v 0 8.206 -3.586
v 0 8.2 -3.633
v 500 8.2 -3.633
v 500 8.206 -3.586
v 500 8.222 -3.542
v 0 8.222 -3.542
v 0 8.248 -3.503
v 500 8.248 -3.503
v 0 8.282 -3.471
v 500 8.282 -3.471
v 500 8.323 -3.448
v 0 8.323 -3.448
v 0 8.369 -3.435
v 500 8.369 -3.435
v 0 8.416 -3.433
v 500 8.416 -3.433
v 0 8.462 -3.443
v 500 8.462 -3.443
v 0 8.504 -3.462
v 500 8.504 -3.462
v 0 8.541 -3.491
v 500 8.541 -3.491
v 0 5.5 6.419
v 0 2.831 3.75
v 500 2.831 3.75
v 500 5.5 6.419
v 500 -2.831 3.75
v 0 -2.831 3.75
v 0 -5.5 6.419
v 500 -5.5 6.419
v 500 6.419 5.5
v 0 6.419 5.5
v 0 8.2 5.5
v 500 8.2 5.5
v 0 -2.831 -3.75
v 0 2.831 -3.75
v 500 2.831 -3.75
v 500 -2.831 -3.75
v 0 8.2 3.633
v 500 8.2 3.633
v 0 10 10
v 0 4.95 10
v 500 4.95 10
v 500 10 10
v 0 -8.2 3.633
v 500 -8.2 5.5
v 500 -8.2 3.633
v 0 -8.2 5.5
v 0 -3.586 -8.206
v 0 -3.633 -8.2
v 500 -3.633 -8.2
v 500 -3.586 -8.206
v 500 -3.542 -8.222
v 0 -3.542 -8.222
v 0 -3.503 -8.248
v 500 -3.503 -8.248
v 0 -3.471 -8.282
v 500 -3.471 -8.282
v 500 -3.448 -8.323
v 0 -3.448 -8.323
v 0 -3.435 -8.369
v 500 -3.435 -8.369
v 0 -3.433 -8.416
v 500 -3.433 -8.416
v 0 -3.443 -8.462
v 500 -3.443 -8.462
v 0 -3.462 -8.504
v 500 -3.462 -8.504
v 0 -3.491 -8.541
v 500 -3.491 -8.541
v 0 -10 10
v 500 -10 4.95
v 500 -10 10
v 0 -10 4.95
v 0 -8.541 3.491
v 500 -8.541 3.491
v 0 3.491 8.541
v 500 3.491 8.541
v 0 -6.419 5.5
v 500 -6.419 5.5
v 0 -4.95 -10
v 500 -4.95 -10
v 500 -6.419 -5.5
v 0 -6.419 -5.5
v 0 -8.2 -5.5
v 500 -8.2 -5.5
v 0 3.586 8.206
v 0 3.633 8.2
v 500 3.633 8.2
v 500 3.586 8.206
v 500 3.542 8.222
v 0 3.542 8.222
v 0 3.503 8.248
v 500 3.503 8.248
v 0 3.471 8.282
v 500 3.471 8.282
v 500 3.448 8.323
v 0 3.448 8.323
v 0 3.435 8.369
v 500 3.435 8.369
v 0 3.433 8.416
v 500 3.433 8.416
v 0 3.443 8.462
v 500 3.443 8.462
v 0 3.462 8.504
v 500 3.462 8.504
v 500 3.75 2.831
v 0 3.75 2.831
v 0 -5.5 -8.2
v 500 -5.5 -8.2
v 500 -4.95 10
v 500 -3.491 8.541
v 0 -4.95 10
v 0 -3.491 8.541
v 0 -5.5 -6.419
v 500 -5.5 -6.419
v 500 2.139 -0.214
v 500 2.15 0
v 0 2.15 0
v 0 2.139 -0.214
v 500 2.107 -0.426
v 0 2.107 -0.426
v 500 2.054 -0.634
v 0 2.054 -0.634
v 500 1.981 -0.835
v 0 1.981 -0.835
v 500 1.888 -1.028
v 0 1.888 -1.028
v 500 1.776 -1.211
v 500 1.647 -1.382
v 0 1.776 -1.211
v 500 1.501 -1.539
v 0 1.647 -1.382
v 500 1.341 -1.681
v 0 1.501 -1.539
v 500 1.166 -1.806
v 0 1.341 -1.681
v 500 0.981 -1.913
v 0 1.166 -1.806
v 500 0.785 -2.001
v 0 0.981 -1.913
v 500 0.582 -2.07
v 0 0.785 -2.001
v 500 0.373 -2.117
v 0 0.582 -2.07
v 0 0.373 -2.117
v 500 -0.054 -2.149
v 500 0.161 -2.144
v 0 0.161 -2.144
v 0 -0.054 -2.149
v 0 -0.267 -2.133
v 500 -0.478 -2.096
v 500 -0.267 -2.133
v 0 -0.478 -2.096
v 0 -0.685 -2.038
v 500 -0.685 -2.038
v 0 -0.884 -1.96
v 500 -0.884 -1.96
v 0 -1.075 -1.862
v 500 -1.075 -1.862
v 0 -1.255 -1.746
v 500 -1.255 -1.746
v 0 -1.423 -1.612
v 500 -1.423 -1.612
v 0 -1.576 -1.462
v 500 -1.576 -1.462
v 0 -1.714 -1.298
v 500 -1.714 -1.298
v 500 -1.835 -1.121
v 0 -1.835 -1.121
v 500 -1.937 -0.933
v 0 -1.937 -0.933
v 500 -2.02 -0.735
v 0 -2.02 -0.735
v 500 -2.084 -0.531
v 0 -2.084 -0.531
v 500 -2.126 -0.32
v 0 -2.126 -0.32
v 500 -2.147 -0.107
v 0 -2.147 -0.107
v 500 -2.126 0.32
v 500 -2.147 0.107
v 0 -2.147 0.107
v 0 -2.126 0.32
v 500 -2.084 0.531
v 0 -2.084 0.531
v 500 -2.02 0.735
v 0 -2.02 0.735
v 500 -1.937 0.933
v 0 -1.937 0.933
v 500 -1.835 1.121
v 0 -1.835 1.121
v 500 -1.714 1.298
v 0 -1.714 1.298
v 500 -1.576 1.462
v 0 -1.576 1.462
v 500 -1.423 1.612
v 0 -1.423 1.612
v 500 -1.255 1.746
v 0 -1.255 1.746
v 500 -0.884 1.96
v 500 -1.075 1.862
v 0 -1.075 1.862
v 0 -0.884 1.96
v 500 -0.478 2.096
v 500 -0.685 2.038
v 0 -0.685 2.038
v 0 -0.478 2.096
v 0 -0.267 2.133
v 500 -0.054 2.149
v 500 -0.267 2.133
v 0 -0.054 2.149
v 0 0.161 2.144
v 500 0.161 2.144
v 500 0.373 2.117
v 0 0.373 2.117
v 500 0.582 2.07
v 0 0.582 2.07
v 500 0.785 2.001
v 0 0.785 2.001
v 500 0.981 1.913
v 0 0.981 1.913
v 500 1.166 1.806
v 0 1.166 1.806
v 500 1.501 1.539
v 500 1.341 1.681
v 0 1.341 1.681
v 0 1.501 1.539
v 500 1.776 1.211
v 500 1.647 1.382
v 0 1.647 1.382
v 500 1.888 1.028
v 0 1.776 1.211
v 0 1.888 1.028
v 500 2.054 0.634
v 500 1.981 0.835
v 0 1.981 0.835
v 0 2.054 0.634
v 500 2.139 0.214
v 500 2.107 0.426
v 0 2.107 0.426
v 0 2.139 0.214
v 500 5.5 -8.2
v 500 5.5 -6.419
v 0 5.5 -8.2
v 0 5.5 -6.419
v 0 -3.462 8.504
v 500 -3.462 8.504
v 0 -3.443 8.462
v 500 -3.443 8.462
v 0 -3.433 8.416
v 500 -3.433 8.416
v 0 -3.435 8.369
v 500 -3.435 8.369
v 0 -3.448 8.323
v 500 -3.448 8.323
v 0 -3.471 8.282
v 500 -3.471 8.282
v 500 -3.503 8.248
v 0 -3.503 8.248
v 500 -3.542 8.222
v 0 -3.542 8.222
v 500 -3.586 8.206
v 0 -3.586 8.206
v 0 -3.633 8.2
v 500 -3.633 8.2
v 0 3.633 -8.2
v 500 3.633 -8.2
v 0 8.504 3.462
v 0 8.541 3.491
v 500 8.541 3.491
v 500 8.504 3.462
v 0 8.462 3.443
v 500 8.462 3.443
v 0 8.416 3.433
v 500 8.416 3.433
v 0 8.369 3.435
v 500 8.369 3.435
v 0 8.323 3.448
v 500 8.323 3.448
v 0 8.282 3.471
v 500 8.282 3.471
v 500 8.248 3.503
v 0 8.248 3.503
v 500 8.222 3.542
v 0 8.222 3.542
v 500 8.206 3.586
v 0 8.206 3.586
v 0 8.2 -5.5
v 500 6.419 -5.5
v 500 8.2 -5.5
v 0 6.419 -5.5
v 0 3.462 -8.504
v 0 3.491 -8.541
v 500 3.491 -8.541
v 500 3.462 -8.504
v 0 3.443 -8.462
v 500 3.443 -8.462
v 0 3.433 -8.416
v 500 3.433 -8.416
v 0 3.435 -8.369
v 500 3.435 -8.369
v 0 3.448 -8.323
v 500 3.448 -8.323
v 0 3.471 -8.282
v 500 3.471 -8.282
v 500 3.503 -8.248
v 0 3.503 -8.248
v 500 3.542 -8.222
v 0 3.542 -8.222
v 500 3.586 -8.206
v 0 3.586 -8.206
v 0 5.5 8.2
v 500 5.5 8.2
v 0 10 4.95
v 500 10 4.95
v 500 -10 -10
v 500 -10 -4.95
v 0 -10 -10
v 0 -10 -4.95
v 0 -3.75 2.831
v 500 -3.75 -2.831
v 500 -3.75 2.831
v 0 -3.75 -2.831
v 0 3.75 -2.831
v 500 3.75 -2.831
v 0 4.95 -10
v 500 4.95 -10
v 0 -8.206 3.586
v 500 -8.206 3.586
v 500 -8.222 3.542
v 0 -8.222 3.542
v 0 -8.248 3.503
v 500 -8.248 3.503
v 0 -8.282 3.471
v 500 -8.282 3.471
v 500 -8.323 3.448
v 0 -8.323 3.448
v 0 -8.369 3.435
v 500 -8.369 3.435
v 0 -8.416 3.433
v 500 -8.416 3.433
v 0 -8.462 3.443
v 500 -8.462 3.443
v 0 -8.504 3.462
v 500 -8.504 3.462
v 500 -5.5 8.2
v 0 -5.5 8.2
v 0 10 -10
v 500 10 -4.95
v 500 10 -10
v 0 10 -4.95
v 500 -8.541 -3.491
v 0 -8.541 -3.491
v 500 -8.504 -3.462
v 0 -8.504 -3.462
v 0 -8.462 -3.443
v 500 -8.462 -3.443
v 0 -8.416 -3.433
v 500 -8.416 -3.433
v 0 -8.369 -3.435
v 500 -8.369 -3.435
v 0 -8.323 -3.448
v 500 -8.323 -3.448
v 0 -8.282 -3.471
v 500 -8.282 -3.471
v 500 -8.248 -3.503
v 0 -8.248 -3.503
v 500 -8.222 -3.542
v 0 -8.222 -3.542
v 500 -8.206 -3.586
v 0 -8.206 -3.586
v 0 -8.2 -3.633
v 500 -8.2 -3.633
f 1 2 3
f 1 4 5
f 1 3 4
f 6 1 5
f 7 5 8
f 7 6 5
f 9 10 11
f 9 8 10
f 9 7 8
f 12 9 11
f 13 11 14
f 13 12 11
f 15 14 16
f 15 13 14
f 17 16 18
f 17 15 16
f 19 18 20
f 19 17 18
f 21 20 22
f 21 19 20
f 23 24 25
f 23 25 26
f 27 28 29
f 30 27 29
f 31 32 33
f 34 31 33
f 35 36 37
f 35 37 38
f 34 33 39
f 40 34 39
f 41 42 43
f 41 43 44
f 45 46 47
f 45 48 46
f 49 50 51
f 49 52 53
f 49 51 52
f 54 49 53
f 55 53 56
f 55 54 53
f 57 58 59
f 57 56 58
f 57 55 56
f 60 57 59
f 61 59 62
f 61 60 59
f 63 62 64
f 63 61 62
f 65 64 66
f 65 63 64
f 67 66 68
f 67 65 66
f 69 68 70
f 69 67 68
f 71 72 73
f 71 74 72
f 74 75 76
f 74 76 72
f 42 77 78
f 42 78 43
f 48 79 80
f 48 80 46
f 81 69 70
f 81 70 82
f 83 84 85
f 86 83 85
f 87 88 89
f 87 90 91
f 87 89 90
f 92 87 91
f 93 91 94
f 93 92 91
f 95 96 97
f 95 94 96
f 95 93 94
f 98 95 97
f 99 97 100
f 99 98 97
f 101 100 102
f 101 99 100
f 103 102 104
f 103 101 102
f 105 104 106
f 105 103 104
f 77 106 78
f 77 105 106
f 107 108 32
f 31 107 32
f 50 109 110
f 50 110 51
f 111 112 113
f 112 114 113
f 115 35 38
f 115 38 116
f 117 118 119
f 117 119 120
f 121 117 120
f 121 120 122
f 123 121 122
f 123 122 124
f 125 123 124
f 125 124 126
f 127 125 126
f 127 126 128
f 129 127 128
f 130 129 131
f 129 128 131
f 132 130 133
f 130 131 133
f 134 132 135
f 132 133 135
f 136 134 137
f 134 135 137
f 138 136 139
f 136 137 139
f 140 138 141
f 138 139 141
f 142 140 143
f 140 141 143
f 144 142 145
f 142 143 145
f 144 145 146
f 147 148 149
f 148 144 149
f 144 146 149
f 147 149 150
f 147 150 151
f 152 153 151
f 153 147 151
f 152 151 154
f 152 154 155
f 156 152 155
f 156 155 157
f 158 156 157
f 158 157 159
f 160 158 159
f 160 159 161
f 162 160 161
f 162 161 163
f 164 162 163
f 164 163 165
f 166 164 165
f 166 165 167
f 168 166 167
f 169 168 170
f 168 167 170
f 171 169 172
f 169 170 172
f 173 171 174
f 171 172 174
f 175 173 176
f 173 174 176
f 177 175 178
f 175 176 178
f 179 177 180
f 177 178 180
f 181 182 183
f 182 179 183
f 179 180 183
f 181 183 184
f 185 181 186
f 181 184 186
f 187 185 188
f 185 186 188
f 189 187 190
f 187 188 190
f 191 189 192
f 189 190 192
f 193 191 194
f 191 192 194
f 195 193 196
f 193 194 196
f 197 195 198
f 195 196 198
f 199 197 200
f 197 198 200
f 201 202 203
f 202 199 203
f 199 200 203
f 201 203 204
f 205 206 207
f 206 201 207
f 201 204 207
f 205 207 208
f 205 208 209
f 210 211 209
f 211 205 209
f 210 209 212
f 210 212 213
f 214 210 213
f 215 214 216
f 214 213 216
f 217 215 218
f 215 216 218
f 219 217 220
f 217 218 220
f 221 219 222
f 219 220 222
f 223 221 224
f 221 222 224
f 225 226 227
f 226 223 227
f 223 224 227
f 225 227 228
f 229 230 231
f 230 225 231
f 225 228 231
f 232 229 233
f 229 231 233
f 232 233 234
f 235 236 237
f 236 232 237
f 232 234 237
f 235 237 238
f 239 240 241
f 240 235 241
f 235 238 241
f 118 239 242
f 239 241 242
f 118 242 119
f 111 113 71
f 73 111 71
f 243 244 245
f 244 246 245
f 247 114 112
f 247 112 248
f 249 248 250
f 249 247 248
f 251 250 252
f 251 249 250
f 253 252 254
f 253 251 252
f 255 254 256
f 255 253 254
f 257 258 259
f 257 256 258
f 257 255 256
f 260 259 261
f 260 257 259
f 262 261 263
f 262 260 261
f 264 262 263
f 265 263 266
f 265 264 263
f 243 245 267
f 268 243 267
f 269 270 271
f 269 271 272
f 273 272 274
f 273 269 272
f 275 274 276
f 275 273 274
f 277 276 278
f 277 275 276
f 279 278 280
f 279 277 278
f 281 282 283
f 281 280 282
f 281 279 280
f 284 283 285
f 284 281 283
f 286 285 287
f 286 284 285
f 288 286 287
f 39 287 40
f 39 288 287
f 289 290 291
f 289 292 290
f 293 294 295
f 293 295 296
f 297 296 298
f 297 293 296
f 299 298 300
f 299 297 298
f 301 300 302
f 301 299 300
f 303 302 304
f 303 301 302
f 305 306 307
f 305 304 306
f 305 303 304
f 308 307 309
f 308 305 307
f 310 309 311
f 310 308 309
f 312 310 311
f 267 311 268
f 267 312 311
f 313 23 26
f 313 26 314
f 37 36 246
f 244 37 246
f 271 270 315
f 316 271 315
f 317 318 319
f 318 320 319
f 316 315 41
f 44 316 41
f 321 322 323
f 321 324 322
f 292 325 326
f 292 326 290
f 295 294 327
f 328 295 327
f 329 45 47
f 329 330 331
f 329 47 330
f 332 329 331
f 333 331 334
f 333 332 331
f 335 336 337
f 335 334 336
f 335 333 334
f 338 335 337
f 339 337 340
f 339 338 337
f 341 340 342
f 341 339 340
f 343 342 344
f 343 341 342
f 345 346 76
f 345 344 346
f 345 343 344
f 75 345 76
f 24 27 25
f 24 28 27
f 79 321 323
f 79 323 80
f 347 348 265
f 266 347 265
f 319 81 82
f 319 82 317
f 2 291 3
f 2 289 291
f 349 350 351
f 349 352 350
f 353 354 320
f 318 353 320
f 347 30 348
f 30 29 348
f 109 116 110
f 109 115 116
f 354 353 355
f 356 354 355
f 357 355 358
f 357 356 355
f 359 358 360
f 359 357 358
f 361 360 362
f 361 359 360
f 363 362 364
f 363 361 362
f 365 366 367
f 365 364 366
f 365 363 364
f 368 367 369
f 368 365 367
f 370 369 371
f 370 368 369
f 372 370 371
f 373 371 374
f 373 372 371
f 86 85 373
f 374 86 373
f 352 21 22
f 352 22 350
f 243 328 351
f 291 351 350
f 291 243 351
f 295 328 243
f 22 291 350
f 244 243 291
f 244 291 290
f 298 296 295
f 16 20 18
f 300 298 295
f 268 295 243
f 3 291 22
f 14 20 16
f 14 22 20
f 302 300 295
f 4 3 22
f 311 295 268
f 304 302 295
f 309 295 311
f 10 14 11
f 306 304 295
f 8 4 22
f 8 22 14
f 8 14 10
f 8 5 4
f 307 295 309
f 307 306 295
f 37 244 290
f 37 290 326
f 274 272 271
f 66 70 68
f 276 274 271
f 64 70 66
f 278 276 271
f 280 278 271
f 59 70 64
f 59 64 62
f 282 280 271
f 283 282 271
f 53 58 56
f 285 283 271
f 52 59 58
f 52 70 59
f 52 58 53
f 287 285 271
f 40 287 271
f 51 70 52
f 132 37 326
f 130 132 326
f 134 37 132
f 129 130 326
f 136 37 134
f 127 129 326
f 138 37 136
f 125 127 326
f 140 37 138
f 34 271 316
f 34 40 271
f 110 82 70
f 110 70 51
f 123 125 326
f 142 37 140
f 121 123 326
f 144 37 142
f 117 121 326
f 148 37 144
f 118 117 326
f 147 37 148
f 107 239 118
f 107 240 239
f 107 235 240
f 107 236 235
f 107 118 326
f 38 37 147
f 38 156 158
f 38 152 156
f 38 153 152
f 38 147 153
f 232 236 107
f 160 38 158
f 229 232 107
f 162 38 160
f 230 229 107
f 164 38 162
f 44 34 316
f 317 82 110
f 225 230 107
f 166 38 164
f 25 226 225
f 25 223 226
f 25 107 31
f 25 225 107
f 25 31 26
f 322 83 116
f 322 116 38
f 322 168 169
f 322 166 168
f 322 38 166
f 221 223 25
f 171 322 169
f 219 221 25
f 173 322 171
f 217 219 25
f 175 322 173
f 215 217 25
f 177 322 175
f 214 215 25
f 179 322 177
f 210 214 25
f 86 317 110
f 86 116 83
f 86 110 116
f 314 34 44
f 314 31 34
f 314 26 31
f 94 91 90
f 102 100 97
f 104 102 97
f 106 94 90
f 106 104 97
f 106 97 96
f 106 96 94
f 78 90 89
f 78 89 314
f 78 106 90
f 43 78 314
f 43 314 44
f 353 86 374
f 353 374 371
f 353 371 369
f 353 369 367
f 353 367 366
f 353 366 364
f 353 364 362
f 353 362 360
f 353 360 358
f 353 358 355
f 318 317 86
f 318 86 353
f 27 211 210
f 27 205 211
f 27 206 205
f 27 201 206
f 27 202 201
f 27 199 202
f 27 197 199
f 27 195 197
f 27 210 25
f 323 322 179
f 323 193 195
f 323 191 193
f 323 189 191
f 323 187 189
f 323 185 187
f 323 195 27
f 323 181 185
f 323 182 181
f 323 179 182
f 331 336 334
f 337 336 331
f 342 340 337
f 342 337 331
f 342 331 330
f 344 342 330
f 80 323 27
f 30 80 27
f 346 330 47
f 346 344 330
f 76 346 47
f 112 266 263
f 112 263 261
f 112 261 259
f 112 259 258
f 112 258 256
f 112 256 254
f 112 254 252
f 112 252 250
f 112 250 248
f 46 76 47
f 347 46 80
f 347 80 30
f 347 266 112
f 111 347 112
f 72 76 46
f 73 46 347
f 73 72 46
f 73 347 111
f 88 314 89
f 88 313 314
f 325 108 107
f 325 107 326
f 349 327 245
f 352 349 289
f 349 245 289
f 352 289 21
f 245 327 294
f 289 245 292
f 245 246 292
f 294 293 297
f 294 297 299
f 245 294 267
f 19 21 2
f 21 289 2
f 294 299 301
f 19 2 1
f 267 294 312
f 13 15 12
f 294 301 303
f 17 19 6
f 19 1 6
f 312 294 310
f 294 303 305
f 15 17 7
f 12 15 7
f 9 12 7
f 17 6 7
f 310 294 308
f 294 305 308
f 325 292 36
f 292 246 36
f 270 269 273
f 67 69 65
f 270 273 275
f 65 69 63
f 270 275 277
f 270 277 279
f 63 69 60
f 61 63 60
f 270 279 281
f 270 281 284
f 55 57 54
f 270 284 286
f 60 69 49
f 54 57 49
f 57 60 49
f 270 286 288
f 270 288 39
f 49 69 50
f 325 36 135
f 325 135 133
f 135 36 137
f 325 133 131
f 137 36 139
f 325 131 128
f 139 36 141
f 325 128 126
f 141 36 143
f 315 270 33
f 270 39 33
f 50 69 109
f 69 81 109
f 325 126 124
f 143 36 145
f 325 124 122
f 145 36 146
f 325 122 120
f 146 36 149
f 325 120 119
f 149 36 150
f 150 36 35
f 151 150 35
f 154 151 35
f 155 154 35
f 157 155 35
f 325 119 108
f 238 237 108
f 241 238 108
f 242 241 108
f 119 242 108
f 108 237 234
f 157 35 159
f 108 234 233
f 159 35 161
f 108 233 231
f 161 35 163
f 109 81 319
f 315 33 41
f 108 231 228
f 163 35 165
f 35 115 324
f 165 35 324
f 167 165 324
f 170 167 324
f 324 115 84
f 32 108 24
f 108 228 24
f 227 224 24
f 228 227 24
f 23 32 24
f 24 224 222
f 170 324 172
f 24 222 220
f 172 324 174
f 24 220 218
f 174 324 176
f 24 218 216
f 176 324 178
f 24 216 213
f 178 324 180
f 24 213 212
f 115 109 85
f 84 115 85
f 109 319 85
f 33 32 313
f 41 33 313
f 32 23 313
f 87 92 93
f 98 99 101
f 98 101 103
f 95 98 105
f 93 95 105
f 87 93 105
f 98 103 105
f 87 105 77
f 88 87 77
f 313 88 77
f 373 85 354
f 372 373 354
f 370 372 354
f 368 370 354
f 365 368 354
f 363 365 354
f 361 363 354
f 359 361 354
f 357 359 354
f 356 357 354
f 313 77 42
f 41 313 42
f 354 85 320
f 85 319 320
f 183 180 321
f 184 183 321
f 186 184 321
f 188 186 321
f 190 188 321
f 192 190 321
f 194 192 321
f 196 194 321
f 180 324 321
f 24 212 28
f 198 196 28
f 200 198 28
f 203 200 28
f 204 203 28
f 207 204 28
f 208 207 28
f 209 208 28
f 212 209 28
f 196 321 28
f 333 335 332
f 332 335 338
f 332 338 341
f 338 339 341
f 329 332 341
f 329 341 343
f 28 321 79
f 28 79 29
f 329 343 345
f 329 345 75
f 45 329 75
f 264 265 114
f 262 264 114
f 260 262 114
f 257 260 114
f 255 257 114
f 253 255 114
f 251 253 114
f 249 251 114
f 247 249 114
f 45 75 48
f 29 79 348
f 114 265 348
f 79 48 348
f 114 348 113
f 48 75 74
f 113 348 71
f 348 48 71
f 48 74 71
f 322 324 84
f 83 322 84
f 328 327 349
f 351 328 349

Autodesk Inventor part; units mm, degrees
ref_plane "YZ Plane" through (0, 0, 0) normal (1, 0, 0) x (0, 1, 0)
ref_plane "XZ Plane" through (0, 0, 0) normal (0, 1, 0) x (-1, 0, 0)
ref_plane "XY Plane" through (0, 0, 0) normal (0, 0, 1) x (1, 0, 0)
sketch "Sketch1" plane through (0, 0, 0) normal (1, 0, 0) x (0, 1, 0)
  arc A0 (0, -2.15) -> (2.15, 0) centre (0, 0) ccw
  line L0 (3.75, 0) -> (3.75, -2.8308)
  line L1 (2.8308, -3.75) -> (0, -3.75)
  line L2 (0, 0) -> (10, 0) construction
  line L3 (10, 0) -> (10, -10) construction
  line L4 (10, -10) -> (0, -10) construction
  line L5 (0, -10) -> (0, 0) construction
  line L6 (3.75, -2.8308) -> (6.4192, -5.5)
  line L7 (2.8308, -3.75) -> (5.5, -6.4192)
  line L8 (5.5, -6.4192) -> (5.5, -8.2)
  line L9 (5.5, -8.2) -> (3.15, -8.2)
  line L10 (0, 0) -> (5.5, 0) construction
  line L11 (5.5, 0) -> (5.5, -5.5) construction
  line L12 (5.5, -5.5) -> (0, -5.5) construction
  line L13 (0, -5.5) -> (0, 0) construction
  line L14 (6.4192, -5.5) -> (8.2, -5.5)
  line L15 (3.4914, -8.5414) -> (4.95, -10)
  line L16 (3.6328, -8.2) -> (5.6956, -8.2) construction
  line L17 (8.2, -5.5) -> (8.2, -3.6328)
  line L18 (8.5414, -3.4914) -> (10, -4.95)
  line L19 (10, -4.95) -> (10, -10)
  line L20 (4.95, -10) -> (10, -10)
  arc A1 (2.15, 0) -> (0, -2.15) centre (0, 0) ccw construction
  arc A2 (3.6328, -8.2) -> (3.4914, -8.5414) centre (3.6328, -8.4) ccw
  arc A3 (8.5414, -3.4914) -> (8.2, -3.6328) centre (8.4, -3.6328) ccw
  line L21 (3.75, 0) -> (2.15, 0)
  line L22 (0, -2.15) -> (0, -3.75)
  point P0 (8.2, -3.15)
  dimension "d0" = 4.3
  dimension "d1" = 3.75
  dimension "d2" = 3.75
  dimension "d5" = 10
  dimension "d6" = 10
  dimension "d10" = 5.5
  dimension "d11" = 5.5
  dimension "d12" = 1.8
  dimension "d14" = 1.3
  dimension "d15" = 45
  dimension "d16" = 3.15
  dimension "d17" = 45
  dimension "d18" = 3.15
  dimension "d19" = 1.8
  dimension "d20" = 0.2
extrude "Extrusion1" add sketch "Sketch1" along normal blind 500
pattern_circular "Circular Pattern1" count 4 over 360 about axis through (0, 0, 0) along (-1, 0, 0) of "Extrusion1"
equation "\"d2\" = d1"
equation "\"d18\" = d16"
equation "\"d19\" = d12"
properties part number "VSlot Extrusion 20x20x650mm"
